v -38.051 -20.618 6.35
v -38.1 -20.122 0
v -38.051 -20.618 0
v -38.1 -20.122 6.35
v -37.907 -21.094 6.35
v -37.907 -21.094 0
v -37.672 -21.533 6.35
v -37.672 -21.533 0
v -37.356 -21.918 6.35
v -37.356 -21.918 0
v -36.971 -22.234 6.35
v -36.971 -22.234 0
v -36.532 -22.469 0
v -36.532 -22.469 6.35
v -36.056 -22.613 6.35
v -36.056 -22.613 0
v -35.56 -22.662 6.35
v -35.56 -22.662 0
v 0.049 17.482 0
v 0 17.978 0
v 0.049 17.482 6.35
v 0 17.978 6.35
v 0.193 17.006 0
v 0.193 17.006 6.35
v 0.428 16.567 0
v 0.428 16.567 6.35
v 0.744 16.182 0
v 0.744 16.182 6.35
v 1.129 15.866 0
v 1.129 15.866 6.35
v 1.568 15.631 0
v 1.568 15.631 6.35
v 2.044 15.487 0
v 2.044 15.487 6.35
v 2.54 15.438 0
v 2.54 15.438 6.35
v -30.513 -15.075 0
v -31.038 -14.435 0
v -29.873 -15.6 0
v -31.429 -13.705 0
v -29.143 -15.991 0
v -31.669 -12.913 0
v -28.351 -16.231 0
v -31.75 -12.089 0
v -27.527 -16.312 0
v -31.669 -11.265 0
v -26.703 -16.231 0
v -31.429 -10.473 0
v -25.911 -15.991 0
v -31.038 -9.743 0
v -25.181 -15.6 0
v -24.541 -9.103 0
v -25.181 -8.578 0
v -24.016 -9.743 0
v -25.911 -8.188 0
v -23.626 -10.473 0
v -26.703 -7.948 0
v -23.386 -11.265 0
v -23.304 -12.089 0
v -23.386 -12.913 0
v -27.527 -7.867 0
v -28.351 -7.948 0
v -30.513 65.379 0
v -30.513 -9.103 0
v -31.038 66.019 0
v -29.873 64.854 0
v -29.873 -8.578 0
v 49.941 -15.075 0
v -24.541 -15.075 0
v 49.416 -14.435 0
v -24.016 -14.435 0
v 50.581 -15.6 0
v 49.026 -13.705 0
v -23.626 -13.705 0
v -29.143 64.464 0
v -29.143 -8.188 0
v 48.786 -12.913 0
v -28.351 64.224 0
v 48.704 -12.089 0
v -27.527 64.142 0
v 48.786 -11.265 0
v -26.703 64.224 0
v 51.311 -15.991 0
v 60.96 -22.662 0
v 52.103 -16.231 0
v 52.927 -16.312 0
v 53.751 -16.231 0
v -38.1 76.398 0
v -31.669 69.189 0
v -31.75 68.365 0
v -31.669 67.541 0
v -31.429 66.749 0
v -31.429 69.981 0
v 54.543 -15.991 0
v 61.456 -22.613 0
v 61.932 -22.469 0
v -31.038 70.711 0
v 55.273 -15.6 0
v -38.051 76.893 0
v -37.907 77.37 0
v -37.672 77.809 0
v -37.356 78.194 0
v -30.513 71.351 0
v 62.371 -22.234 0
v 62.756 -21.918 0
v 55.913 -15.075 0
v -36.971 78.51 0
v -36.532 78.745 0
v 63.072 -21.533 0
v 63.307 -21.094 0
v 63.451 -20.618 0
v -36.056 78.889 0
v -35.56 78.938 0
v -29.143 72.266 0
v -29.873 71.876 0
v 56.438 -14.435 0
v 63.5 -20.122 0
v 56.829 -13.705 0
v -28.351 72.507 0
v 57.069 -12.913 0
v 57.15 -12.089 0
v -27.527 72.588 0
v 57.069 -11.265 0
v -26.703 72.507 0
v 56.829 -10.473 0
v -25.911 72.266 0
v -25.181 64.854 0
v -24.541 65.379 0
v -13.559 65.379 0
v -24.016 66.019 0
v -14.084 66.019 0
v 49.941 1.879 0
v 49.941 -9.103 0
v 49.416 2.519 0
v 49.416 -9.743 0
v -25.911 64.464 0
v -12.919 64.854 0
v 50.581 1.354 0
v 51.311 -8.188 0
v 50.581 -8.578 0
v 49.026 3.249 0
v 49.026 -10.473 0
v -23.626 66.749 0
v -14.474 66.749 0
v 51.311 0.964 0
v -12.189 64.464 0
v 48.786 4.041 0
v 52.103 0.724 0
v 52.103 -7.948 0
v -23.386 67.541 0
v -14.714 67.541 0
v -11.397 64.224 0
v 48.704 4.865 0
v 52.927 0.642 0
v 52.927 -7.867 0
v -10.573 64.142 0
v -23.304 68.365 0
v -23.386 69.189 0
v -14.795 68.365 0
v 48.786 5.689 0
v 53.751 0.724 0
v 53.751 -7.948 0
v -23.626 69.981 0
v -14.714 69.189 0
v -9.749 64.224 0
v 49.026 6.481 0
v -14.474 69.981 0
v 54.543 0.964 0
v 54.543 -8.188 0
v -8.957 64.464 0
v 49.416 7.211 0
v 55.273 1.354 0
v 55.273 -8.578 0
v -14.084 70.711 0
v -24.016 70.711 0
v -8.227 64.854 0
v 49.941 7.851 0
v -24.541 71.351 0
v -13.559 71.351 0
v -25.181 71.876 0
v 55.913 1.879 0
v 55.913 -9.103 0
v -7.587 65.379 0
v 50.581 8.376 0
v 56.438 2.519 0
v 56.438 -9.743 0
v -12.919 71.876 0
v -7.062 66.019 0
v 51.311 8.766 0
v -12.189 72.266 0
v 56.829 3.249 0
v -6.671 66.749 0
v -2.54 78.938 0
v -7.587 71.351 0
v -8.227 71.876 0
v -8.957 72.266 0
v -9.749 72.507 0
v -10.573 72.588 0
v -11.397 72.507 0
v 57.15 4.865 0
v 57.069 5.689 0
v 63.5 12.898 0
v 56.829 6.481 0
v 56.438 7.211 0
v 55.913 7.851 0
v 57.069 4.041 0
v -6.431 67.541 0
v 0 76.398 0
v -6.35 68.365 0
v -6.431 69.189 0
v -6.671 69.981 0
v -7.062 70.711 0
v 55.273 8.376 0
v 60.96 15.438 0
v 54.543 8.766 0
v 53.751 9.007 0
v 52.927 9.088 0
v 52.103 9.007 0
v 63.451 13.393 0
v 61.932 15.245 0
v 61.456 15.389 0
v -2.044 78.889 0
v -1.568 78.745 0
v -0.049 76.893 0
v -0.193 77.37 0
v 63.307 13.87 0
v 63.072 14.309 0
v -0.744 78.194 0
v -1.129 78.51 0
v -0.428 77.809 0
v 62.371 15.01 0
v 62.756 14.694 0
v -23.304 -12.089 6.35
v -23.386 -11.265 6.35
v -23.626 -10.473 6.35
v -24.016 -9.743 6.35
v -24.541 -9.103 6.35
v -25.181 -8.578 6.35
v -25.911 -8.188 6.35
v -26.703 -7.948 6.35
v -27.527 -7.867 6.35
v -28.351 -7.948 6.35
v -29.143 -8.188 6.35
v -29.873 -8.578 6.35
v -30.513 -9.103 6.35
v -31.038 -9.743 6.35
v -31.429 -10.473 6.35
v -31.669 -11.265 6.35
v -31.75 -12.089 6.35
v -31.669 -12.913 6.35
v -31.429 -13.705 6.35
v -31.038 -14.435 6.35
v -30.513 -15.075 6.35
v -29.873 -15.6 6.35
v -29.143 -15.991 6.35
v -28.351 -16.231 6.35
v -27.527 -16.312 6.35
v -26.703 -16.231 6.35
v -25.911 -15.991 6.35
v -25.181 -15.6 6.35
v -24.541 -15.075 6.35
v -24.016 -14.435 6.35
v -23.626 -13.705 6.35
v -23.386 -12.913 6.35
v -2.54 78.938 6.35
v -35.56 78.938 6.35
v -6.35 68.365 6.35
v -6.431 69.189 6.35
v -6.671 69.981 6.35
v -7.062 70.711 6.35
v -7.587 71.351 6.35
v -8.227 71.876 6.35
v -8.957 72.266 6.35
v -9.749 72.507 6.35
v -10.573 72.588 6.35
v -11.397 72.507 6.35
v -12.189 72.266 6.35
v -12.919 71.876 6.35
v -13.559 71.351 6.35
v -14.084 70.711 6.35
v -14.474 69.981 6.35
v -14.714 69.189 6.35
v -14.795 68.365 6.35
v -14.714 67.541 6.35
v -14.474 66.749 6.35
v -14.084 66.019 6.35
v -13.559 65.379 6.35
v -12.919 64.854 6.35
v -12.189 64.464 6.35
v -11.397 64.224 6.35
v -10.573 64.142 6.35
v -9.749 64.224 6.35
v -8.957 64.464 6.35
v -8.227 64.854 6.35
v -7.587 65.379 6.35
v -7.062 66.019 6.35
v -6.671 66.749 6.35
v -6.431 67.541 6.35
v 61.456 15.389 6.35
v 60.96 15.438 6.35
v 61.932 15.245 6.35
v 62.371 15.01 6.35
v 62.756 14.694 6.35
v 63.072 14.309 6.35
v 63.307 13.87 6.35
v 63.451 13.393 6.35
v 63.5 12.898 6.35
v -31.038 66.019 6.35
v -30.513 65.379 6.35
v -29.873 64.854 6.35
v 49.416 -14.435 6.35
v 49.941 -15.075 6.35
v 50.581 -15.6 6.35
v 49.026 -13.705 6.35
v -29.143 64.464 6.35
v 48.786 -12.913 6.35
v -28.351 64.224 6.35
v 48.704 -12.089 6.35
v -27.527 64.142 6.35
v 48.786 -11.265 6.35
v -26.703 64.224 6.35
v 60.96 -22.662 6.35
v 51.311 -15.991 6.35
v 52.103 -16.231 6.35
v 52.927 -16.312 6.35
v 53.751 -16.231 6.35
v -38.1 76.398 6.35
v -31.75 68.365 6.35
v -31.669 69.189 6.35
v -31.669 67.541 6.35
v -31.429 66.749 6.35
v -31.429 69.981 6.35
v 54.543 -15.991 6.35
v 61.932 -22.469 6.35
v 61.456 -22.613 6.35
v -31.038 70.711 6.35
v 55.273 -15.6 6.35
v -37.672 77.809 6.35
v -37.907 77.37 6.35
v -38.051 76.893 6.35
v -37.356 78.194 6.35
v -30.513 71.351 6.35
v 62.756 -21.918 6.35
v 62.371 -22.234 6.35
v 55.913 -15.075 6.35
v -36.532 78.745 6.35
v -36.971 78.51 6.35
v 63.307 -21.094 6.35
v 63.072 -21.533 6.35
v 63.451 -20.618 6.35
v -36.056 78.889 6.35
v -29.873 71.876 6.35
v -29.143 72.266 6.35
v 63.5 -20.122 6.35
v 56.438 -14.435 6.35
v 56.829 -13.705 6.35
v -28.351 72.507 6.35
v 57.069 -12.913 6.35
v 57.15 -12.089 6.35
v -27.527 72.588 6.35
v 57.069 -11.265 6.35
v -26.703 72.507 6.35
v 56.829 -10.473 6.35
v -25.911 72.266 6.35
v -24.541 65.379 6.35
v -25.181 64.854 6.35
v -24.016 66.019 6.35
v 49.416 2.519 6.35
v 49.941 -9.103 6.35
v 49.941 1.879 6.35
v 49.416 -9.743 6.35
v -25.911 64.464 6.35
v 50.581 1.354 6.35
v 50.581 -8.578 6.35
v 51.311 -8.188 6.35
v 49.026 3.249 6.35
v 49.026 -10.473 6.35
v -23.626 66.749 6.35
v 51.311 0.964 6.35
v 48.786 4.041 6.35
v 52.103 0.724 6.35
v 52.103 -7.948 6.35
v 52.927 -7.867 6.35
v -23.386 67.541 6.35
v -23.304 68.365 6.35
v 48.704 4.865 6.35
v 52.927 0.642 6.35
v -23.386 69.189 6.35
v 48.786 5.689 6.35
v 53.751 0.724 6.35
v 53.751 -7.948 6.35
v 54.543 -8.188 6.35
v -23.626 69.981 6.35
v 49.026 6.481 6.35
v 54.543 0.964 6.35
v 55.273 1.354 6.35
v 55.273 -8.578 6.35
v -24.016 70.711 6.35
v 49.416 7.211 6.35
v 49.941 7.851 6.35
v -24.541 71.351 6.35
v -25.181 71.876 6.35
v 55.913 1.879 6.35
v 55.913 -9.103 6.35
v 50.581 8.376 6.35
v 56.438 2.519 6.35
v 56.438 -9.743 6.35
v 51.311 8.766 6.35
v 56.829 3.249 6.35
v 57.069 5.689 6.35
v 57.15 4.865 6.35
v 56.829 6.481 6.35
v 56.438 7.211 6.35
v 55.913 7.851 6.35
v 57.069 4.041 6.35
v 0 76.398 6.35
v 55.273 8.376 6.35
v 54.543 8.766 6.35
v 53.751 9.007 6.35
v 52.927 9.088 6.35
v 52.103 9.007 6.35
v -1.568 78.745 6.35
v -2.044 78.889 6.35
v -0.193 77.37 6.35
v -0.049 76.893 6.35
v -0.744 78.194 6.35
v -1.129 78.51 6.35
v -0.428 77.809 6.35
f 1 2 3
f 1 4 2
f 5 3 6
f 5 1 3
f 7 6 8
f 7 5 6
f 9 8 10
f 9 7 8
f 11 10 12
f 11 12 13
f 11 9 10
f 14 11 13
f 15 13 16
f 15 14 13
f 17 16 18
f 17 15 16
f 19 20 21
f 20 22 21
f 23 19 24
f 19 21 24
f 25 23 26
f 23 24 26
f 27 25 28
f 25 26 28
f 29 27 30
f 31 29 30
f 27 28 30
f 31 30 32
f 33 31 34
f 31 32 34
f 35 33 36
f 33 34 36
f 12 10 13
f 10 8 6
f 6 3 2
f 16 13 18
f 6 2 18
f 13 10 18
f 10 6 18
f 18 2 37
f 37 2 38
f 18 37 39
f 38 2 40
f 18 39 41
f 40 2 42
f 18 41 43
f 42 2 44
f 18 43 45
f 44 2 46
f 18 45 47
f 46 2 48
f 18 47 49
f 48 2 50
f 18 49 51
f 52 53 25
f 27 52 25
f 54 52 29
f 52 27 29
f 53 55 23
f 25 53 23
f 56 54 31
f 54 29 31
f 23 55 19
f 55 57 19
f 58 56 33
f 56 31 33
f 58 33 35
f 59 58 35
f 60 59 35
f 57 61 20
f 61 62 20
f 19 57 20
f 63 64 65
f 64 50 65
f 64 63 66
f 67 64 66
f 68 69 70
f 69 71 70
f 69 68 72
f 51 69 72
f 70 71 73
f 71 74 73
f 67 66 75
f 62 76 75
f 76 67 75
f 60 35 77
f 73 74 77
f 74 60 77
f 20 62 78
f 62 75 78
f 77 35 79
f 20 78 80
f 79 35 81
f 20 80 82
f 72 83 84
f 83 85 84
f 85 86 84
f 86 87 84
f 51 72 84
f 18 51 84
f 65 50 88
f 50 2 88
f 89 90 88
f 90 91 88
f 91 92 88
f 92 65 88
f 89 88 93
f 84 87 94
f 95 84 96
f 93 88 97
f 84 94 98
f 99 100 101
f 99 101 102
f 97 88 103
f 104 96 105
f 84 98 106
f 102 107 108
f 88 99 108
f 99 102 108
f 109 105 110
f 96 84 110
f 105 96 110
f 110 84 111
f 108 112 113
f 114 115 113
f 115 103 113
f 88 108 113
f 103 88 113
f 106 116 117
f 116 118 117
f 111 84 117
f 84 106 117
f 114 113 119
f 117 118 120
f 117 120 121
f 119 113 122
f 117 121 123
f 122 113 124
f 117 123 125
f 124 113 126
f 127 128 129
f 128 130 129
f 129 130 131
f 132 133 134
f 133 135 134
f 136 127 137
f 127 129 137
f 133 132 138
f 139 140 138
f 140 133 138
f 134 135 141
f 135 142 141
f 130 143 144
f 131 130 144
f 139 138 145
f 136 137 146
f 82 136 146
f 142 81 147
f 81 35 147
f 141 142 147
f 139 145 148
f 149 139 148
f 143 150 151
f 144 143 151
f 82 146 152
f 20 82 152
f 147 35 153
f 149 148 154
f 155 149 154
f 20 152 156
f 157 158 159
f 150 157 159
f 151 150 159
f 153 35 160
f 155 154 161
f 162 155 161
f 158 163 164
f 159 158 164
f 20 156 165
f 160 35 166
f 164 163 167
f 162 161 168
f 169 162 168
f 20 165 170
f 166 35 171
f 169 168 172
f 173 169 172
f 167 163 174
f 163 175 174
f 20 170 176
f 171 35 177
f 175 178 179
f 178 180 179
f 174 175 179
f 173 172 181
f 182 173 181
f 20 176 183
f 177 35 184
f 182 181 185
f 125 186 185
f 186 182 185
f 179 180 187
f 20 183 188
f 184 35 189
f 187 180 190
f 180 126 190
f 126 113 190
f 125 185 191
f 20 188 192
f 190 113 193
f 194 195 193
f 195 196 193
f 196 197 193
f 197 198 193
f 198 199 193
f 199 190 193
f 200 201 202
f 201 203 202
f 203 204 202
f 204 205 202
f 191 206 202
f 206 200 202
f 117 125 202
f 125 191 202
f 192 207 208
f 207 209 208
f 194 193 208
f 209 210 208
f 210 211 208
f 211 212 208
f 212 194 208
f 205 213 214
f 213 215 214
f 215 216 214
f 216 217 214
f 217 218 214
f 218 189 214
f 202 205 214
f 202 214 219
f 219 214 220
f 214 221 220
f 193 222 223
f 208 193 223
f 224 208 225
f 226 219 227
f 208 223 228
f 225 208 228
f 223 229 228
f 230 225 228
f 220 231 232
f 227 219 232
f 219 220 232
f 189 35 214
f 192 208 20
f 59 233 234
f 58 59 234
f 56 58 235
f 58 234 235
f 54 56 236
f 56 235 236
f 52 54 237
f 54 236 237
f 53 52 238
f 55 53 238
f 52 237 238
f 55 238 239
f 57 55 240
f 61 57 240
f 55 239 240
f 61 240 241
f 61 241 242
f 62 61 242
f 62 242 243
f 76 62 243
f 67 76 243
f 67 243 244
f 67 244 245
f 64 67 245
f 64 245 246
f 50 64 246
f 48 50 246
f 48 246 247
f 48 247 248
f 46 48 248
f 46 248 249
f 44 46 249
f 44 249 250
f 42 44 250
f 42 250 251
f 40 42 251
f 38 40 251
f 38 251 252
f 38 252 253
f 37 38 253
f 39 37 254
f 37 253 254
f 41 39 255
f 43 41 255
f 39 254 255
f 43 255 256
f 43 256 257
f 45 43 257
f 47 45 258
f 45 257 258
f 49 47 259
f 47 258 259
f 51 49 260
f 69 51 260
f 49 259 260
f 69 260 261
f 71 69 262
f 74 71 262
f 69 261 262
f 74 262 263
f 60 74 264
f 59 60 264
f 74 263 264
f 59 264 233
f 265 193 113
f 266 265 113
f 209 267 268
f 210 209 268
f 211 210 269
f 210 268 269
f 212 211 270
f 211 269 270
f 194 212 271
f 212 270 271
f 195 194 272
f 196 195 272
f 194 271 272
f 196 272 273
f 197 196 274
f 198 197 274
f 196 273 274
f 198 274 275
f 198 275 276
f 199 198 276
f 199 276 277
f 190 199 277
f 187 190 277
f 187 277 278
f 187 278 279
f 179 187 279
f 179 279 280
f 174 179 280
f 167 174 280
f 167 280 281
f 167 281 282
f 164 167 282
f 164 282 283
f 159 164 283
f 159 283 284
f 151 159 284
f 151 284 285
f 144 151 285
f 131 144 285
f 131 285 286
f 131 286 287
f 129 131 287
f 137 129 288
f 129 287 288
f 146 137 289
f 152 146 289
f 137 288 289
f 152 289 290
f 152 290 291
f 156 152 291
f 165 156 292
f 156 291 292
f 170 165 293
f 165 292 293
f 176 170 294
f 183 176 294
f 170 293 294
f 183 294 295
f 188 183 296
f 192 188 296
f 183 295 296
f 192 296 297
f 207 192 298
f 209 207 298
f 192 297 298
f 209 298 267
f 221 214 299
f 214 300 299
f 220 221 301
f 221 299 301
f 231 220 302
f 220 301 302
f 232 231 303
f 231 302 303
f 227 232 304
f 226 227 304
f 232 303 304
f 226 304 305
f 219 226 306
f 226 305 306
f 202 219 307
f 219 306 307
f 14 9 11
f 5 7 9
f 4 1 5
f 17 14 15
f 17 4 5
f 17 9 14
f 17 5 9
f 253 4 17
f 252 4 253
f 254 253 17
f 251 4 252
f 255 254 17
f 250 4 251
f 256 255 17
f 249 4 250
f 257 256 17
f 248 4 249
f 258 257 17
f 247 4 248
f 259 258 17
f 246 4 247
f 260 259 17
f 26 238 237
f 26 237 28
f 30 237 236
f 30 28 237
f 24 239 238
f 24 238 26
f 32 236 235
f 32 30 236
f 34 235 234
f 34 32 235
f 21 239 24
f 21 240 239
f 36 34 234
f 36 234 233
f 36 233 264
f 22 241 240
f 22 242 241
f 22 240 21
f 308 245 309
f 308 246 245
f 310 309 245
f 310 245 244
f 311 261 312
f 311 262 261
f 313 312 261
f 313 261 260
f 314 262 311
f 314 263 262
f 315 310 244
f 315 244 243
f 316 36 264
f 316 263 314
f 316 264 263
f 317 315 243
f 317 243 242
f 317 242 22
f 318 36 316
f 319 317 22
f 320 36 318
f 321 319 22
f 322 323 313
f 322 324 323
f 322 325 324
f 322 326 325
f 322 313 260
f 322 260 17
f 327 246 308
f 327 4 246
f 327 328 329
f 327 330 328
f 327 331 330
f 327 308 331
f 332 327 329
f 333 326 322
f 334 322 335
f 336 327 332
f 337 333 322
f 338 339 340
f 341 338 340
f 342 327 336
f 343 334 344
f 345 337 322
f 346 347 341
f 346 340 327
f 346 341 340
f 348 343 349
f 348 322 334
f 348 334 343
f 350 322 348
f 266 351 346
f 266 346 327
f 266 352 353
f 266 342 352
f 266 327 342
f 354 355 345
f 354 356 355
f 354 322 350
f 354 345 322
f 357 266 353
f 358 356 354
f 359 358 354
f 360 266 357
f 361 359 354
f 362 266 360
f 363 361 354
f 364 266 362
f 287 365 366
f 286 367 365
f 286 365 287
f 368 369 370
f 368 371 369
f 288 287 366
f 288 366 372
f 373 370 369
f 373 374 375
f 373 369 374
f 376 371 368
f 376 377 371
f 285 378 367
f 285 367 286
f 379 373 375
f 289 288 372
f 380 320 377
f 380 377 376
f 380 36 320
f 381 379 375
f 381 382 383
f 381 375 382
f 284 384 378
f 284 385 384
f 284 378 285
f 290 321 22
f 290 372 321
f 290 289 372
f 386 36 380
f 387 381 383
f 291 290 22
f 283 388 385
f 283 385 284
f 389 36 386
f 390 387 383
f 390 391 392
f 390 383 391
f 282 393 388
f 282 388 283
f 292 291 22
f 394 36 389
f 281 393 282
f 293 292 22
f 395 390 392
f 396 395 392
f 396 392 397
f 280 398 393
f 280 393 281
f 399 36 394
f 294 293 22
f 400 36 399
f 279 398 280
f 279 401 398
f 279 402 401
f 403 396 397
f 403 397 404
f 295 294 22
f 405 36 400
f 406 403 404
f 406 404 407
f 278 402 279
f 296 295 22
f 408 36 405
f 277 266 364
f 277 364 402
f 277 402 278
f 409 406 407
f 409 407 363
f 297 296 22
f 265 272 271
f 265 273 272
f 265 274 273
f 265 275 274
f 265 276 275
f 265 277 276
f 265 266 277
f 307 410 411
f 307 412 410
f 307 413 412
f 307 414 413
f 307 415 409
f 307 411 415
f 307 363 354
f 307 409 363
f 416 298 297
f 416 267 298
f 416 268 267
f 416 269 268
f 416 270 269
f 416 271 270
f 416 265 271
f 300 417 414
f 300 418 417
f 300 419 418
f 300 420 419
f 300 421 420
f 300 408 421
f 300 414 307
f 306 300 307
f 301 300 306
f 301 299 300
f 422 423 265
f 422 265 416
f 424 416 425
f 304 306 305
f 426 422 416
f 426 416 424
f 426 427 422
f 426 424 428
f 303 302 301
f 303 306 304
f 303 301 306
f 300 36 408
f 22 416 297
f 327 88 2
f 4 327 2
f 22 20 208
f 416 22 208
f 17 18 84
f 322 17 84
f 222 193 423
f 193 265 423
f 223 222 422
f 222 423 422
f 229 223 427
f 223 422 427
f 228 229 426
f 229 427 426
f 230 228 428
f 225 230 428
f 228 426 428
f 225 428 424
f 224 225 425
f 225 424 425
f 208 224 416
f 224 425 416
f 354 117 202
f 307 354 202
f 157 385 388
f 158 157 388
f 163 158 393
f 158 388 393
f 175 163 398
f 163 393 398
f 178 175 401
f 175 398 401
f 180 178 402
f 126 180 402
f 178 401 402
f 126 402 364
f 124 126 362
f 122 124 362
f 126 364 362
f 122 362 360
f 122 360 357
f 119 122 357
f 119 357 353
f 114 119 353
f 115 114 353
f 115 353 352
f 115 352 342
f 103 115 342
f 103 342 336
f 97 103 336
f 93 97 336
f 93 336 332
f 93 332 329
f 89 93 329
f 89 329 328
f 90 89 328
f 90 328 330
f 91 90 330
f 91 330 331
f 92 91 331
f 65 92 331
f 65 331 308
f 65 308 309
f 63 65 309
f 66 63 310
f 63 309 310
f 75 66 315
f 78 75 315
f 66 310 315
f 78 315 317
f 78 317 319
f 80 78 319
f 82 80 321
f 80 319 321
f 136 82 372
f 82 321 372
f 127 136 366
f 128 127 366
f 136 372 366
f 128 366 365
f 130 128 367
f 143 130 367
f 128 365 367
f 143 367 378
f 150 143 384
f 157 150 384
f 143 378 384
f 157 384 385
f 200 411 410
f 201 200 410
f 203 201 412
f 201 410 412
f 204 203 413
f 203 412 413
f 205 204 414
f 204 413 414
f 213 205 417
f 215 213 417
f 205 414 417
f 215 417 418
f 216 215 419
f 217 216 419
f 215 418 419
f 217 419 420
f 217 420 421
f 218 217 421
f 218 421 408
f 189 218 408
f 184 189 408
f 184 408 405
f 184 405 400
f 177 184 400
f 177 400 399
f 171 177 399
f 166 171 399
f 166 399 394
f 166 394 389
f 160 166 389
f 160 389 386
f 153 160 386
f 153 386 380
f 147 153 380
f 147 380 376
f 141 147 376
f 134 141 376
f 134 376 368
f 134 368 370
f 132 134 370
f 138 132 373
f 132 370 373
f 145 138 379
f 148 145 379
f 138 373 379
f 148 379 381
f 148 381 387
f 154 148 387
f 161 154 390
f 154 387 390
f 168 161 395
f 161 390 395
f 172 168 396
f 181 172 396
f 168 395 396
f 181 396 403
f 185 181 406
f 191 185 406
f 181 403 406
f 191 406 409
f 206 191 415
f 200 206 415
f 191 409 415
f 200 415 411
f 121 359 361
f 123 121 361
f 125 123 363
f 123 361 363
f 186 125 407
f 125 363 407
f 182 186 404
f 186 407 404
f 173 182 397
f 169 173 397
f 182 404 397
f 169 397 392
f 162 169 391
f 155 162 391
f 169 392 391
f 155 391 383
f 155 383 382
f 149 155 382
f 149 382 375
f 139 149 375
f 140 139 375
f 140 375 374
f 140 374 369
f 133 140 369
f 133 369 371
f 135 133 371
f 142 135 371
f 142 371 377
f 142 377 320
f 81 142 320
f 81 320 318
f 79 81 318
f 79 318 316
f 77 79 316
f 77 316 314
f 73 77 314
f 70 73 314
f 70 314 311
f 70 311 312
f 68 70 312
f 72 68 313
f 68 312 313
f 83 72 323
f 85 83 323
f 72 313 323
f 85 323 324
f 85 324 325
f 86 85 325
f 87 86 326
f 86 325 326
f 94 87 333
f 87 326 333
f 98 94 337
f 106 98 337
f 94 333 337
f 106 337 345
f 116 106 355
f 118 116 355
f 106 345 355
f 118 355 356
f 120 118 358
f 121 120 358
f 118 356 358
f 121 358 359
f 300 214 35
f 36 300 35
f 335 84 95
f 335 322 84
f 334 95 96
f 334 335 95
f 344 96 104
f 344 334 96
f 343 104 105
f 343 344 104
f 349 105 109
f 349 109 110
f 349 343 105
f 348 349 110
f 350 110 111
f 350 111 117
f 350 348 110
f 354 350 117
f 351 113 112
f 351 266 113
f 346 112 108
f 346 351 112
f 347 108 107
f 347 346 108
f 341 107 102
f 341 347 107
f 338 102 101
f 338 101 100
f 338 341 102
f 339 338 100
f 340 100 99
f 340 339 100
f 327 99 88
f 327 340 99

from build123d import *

# Parameters (mm, degrees)
F1_DEPTH = 6.35
F2_R     = 4.22275
F3_DEPTH = 6.351
F4_R     = 2.54


# Not quite as in the source:
# - a length typed as a fraction of an inch, garbled in the dataset ("3 / 203.2 mm" for 3/8 in), is restored


with BuildPart() as f1:
    # F0 (on Top) → F1 (new body)
    with BuildSketch(Plane.XY):
        Polygon((0, 78.937935479), (-38.1, 78.937935479), (-38.1, -22.662064521), (63.5, -22.662064521), (63.5, 15.437935479), (0, 15.437935479), align=None)
    extrude(amount=F1_DEPTH)

    # F2 (on face) → F3 (cut, through all)
    with BuildSketch(Plane.XY.offset(6.35)):
        with Locations((-27.52725, 68.365185479)):
            Circle(F2_R)
        with Locations((-10.57275, 68.365185479)):
            Circle(F2_R)
        with Locations((52.92725, 4.865185479)):
            Circle(F2_R)
        with Locations((52.92725, -12.089314521)):
            Circle(F2_R)
        with Locations((-27.52725, -12.089314521)):
            Circle(F2_R)
    extrude(amount=-F3_DEPTH, mode=Mode.SUBTRACT)

    # F4
    f4_edges = [f1.edges().sort_by_distance(p)[0] for p in [
        (-38.1, -22.662065, 3.175),
        (63.5, -22.662065, 3.175),
        (63.5, 15.437935, 3.175),
        (0, 15.437935, 3.175),
        (0, 78.937935, 3.175),
        (-38.1, 78.937935, 3.175),
    ]]
    fillet(f4_edges, radius=F4_R)


solid = f1.part
